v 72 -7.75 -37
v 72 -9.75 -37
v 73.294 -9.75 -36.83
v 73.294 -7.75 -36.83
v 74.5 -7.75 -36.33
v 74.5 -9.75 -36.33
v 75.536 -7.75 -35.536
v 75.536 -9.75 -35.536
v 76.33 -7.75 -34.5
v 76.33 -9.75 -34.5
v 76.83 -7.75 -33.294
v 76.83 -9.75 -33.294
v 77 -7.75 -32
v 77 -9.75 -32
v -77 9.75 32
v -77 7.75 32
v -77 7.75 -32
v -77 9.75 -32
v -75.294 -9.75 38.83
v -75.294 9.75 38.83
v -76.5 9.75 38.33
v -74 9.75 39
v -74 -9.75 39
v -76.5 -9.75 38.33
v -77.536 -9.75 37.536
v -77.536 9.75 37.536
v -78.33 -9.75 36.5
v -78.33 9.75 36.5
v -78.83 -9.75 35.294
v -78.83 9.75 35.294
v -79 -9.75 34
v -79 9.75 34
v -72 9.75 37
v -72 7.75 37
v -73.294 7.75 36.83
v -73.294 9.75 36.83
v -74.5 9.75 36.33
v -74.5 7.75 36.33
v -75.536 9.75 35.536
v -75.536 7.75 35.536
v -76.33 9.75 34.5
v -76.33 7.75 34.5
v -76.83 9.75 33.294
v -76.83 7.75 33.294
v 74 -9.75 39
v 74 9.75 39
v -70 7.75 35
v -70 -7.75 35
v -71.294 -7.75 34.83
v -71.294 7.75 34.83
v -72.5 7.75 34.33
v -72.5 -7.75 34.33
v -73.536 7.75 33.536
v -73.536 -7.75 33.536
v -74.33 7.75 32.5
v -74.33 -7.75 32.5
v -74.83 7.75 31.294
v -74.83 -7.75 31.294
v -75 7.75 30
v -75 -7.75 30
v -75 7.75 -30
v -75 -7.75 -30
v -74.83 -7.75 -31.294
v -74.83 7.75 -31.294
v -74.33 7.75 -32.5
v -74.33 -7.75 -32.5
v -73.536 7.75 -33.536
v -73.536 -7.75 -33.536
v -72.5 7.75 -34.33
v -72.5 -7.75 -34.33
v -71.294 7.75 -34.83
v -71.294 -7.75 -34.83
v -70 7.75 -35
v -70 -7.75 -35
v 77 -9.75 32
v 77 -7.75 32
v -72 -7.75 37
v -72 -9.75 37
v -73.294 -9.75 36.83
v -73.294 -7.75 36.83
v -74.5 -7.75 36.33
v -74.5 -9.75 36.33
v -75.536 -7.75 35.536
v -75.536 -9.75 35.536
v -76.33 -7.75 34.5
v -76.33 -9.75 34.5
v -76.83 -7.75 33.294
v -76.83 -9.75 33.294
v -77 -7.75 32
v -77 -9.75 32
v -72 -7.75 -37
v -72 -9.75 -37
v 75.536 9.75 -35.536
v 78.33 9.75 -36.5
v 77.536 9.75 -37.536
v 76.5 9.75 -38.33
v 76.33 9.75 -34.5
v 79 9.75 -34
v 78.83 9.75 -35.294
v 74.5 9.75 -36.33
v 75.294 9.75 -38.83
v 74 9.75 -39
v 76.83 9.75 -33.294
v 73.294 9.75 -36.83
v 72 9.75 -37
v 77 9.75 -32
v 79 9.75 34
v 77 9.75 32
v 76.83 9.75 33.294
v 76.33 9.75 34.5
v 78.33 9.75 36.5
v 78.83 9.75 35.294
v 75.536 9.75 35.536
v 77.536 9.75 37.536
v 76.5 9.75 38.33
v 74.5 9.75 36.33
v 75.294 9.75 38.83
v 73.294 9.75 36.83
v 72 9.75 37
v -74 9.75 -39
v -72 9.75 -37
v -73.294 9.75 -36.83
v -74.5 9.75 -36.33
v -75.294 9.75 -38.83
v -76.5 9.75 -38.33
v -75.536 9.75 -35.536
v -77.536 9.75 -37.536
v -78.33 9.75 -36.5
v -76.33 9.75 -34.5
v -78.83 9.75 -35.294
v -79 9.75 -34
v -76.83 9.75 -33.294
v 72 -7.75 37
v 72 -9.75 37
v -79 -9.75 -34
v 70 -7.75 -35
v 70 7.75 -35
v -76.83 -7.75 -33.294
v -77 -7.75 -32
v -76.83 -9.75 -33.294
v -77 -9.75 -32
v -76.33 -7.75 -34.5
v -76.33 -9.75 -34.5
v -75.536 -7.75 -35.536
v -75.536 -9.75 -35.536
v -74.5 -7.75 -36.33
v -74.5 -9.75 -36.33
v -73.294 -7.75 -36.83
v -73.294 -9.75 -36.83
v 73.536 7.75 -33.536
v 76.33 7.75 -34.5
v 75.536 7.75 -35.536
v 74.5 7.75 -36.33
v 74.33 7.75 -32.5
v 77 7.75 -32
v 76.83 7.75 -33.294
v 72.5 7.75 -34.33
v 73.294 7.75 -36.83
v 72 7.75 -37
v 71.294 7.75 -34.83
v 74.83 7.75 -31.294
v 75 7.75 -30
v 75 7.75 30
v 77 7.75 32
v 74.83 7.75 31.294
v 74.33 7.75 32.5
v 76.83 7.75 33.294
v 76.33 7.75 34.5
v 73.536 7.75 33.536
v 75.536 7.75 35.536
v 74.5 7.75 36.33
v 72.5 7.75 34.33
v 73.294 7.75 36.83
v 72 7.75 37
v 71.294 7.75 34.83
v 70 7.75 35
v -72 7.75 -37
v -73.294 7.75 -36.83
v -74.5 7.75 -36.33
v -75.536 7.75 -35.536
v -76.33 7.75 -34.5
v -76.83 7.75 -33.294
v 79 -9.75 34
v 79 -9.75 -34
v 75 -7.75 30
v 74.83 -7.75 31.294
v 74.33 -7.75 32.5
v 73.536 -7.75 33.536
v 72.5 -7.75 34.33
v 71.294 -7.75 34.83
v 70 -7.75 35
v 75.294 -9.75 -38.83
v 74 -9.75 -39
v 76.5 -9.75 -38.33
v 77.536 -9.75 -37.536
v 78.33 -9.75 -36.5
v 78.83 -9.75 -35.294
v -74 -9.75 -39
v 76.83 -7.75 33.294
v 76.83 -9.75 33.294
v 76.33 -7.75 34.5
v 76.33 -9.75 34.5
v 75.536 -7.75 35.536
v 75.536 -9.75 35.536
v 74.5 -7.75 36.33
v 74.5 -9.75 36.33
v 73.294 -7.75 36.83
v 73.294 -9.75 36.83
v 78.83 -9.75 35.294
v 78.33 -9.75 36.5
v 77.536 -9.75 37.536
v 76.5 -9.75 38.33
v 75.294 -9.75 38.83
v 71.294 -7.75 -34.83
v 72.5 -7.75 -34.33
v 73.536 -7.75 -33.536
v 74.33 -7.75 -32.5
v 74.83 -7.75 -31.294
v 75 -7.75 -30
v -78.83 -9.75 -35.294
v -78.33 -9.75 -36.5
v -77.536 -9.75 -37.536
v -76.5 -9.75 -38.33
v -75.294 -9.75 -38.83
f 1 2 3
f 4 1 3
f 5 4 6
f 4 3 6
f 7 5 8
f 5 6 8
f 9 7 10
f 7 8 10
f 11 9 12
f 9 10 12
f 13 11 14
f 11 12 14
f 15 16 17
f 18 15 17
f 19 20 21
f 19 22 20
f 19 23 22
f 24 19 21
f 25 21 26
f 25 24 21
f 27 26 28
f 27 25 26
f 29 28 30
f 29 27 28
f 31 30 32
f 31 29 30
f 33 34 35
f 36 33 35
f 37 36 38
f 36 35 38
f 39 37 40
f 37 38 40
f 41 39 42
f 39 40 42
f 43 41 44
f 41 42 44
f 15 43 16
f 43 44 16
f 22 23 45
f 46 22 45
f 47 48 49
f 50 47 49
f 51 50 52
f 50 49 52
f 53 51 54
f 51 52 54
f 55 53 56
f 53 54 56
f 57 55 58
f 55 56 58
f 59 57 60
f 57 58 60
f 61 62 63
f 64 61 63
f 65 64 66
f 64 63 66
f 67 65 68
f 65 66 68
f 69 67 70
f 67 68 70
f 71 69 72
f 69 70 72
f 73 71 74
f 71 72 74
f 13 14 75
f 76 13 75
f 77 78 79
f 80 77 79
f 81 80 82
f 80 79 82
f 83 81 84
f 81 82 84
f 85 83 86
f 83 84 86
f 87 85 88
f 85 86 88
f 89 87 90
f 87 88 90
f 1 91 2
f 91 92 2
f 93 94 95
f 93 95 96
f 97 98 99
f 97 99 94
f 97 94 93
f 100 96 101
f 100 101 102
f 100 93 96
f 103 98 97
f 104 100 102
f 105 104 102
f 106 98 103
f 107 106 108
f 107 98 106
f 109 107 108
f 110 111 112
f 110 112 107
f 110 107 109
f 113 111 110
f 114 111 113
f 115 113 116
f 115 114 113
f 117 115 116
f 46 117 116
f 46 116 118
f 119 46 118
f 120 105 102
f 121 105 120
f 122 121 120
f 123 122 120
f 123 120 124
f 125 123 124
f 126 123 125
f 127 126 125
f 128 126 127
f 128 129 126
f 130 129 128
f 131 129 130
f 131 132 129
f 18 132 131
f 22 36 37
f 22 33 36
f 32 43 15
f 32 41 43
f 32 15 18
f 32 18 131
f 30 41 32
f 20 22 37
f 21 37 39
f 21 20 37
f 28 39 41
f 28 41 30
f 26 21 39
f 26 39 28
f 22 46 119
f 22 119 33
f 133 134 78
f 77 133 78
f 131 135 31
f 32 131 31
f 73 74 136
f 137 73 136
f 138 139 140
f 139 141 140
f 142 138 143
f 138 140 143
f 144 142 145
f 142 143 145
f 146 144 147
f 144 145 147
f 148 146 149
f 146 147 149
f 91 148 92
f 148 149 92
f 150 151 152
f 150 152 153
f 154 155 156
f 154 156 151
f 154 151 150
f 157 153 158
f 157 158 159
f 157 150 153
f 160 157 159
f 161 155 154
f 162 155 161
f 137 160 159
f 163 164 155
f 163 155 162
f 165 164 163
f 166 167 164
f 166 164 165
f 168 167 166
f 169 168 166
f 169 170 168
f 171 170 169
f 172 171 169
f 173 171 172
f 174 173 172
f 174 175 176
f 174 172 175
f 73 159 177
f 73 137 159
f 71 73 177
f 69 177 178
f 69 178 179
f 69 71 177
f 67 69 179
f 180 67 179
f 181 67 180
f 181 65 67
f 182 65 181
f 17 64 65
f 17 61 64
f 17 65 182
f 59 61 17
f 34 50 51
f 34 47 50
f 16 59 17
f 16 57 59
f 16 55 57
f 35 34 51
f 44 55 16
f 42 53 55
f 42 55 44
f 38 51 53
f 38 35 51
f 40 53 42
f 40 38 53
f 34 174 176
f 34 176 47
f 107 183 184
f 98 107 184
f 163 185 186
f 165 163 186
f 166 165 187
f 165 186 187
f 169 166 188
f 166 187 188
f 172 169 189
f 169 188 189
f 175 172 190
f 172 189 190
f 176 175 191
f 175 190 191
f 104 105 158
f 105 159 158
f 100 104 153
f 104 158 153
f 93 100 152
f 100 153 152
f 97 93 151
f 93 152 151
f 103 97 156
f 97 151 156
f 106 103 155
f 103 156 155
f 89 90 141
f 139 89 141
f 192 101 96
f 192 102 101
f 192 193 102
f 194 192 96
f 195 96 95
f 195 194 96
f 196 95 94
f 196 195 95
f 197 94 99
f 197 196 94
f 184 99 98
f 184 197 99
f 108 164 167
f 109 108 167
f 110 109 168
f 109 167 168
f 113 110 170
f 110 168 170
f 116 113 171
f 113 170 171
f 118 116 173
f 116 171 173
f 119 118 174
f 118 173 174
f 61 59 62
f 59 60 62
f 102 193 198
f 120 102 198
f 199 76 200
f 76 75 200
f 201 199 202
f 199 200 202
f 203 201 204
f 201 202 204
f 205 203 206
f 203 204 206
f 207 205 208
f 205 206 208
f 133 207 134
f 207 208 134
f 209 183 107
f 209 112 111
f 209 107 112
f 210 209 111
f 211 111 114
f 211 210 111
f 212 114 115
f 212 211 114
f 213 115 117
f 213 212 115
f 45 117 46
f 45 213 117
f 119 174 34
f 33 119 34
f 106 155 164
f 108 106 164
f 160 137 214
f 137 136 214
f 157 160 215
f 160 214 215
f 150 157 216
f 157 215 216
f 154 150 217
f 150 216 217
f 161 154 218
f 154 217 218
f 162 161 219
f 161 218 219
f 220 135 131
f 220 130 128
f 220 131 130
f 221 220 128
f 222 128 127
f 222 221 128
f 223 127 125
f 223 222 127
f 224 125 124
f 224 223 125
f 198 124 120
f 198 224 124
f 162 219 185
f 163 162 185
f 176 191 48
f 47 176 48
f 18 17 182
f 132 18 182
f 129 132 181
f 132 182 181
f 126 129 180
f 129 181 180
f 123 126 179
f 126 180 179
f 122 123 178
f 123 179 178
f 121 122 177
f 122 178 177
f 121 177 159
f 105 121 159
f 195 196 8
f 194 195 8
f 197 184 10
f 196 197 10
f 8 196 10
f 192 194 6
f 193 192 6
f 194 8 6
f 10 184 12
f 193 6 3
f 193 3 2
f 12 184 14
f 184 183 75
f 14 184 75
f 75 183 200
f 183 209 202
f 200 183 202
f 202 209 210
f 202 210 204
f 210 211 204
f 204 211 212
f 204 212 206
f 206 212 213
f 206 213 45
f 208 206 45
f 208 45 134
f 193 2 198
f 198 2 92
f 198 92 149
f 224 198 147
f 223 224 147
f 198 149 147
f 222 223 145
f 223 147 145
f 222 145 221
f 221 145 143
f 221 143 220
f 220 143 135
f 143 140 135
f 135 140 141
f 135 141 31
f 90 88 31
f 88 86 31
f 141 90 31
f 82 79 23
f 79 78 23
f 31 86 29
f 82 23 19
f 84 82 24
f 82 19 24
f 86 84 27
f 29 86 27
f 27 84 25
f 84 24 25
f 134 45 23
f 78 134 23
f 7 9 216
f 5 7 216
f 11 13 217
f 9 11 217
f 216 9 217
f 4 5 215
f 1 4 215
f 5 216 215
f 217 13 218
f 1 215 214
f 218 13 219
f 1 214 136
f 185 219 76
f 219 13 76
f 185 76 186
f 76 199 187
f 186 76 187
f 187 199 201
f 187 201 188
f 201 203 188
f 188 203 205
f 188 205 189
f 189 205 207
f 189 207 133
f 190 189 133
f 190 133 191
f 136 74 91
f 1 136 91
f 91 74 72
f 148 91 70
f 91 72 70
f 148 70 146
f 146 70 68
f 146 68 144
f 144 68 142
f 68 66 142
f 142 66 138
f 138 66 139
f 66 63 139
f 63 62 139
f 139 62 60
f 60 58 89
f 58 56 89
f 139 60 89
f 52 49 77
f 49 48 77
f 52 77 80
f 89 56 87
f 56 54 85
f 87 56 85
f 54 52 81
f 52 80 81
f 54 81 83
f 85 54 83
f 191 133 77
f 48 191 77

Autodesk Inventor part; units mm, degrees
ref_plane "YZ Plane" through (0, 0, 0) normal (1, 0, 0) x (0, 1, 0)
ref_plane "XZ Plane" through (0, 0, 0) normal (0, 1, 0) x (-1, 0, 0)
ref_plane "XY Plane" through (0, 0, 0) normal (0, 0, 1) x (1, 0, 0)
sketch "Sketch1" plane through (0, 0, 0) normal (0, 1, 0) x (-1, 0, 0)
  line L0 (-70, 35) -> (70, 35)
  line L1 (75, 30) -> (75, -30)
  line L2 (70, -35) -> (-70, -35)
  line L3 (-75, -30) -> (-75, 30)
  line L4 (-75, 35) -> (75, -35) construction
  line L5 (75, 35) -> (-75, -35) construction
  arc A0 (75, 30) -> (70, 35) centre (70, 30) ccw
  arc A1 (70, -35) -> (75, -30) centre (70, -30) ccw
  arc A2 (-70, 35) -> (-75, 30) centre (-70, 30) ccw
  arc A3 (-75, -30) -> (-70, -35) centre (-70, -30) ccw
  line L6 (-72, 37) -> (72, 37)
  line L7 (77, 32) -> (77, -32)
  line L8 (72, -37) -> (-72, -37)
  line L9 (-77, -32) -> (-77, 32)
  line L10 (-77, 37) -> (77, -37) construction
  line L11 (77, 37) -> (-77, -37) construction
  arc A4 (77, 32) -> (72, 37) centre (72, 32) ccw
  arc A5 (72, -37) -> (77, -32) centre (72, -32) ccw
  arc A6 (-77, -32) -> (-72, -37) centre (-72, -32) ccw
  arc A7 (-72, 37) -> (-77, 32) centre (-72, 32) ccw
  line L12 (74, 39) -> (-74, 39)
  line L13 (-79, 34) -> (-79, -34)
  line L14 (-74, -39) -> (74, -39)
  line L15 (79, -34) -> (79, 34)
  line L16 (79, 39) -> (-79, -39) construction
  line L17 (-79, 39) -> (79, -39) construction
  arc A8 (79, 34) -> (74, 39) centre (74, 34) ccw
  arc A9 (-74, 39) -> (-79, 34) centre (-74, 34) ccw
  arc A10 (-79, -34) -> (-74, -39) centre (-74, -34) ccw
  arc A11 (74, -39) -> (79, -34) centre (74, -34) ccw
  point P0 (0, 0)
  dimension "d0" = 150
  dimension "d1" = 70
  dimension "d2" = 5
  dimension "d6" = 2
  dimension "d7" = 2
  dimension "d8" = 5
  dimension "d9" = 4
  dimension "d10" = 4
  dimension "d11" = 5
extrude "Extrusion1" add sketch "Sketch1" along normal mid plane 15.5 contours L6 A4 L7 A5 L8 A6 L9 A7
extrude "Extrusion2" add sketch "Sketch1" along normal mid plane 19.5 contours A8 L15 A11 L14 A10 L13 A9 L12
properties part number "Box2_walls" material "PPS Plastic"
